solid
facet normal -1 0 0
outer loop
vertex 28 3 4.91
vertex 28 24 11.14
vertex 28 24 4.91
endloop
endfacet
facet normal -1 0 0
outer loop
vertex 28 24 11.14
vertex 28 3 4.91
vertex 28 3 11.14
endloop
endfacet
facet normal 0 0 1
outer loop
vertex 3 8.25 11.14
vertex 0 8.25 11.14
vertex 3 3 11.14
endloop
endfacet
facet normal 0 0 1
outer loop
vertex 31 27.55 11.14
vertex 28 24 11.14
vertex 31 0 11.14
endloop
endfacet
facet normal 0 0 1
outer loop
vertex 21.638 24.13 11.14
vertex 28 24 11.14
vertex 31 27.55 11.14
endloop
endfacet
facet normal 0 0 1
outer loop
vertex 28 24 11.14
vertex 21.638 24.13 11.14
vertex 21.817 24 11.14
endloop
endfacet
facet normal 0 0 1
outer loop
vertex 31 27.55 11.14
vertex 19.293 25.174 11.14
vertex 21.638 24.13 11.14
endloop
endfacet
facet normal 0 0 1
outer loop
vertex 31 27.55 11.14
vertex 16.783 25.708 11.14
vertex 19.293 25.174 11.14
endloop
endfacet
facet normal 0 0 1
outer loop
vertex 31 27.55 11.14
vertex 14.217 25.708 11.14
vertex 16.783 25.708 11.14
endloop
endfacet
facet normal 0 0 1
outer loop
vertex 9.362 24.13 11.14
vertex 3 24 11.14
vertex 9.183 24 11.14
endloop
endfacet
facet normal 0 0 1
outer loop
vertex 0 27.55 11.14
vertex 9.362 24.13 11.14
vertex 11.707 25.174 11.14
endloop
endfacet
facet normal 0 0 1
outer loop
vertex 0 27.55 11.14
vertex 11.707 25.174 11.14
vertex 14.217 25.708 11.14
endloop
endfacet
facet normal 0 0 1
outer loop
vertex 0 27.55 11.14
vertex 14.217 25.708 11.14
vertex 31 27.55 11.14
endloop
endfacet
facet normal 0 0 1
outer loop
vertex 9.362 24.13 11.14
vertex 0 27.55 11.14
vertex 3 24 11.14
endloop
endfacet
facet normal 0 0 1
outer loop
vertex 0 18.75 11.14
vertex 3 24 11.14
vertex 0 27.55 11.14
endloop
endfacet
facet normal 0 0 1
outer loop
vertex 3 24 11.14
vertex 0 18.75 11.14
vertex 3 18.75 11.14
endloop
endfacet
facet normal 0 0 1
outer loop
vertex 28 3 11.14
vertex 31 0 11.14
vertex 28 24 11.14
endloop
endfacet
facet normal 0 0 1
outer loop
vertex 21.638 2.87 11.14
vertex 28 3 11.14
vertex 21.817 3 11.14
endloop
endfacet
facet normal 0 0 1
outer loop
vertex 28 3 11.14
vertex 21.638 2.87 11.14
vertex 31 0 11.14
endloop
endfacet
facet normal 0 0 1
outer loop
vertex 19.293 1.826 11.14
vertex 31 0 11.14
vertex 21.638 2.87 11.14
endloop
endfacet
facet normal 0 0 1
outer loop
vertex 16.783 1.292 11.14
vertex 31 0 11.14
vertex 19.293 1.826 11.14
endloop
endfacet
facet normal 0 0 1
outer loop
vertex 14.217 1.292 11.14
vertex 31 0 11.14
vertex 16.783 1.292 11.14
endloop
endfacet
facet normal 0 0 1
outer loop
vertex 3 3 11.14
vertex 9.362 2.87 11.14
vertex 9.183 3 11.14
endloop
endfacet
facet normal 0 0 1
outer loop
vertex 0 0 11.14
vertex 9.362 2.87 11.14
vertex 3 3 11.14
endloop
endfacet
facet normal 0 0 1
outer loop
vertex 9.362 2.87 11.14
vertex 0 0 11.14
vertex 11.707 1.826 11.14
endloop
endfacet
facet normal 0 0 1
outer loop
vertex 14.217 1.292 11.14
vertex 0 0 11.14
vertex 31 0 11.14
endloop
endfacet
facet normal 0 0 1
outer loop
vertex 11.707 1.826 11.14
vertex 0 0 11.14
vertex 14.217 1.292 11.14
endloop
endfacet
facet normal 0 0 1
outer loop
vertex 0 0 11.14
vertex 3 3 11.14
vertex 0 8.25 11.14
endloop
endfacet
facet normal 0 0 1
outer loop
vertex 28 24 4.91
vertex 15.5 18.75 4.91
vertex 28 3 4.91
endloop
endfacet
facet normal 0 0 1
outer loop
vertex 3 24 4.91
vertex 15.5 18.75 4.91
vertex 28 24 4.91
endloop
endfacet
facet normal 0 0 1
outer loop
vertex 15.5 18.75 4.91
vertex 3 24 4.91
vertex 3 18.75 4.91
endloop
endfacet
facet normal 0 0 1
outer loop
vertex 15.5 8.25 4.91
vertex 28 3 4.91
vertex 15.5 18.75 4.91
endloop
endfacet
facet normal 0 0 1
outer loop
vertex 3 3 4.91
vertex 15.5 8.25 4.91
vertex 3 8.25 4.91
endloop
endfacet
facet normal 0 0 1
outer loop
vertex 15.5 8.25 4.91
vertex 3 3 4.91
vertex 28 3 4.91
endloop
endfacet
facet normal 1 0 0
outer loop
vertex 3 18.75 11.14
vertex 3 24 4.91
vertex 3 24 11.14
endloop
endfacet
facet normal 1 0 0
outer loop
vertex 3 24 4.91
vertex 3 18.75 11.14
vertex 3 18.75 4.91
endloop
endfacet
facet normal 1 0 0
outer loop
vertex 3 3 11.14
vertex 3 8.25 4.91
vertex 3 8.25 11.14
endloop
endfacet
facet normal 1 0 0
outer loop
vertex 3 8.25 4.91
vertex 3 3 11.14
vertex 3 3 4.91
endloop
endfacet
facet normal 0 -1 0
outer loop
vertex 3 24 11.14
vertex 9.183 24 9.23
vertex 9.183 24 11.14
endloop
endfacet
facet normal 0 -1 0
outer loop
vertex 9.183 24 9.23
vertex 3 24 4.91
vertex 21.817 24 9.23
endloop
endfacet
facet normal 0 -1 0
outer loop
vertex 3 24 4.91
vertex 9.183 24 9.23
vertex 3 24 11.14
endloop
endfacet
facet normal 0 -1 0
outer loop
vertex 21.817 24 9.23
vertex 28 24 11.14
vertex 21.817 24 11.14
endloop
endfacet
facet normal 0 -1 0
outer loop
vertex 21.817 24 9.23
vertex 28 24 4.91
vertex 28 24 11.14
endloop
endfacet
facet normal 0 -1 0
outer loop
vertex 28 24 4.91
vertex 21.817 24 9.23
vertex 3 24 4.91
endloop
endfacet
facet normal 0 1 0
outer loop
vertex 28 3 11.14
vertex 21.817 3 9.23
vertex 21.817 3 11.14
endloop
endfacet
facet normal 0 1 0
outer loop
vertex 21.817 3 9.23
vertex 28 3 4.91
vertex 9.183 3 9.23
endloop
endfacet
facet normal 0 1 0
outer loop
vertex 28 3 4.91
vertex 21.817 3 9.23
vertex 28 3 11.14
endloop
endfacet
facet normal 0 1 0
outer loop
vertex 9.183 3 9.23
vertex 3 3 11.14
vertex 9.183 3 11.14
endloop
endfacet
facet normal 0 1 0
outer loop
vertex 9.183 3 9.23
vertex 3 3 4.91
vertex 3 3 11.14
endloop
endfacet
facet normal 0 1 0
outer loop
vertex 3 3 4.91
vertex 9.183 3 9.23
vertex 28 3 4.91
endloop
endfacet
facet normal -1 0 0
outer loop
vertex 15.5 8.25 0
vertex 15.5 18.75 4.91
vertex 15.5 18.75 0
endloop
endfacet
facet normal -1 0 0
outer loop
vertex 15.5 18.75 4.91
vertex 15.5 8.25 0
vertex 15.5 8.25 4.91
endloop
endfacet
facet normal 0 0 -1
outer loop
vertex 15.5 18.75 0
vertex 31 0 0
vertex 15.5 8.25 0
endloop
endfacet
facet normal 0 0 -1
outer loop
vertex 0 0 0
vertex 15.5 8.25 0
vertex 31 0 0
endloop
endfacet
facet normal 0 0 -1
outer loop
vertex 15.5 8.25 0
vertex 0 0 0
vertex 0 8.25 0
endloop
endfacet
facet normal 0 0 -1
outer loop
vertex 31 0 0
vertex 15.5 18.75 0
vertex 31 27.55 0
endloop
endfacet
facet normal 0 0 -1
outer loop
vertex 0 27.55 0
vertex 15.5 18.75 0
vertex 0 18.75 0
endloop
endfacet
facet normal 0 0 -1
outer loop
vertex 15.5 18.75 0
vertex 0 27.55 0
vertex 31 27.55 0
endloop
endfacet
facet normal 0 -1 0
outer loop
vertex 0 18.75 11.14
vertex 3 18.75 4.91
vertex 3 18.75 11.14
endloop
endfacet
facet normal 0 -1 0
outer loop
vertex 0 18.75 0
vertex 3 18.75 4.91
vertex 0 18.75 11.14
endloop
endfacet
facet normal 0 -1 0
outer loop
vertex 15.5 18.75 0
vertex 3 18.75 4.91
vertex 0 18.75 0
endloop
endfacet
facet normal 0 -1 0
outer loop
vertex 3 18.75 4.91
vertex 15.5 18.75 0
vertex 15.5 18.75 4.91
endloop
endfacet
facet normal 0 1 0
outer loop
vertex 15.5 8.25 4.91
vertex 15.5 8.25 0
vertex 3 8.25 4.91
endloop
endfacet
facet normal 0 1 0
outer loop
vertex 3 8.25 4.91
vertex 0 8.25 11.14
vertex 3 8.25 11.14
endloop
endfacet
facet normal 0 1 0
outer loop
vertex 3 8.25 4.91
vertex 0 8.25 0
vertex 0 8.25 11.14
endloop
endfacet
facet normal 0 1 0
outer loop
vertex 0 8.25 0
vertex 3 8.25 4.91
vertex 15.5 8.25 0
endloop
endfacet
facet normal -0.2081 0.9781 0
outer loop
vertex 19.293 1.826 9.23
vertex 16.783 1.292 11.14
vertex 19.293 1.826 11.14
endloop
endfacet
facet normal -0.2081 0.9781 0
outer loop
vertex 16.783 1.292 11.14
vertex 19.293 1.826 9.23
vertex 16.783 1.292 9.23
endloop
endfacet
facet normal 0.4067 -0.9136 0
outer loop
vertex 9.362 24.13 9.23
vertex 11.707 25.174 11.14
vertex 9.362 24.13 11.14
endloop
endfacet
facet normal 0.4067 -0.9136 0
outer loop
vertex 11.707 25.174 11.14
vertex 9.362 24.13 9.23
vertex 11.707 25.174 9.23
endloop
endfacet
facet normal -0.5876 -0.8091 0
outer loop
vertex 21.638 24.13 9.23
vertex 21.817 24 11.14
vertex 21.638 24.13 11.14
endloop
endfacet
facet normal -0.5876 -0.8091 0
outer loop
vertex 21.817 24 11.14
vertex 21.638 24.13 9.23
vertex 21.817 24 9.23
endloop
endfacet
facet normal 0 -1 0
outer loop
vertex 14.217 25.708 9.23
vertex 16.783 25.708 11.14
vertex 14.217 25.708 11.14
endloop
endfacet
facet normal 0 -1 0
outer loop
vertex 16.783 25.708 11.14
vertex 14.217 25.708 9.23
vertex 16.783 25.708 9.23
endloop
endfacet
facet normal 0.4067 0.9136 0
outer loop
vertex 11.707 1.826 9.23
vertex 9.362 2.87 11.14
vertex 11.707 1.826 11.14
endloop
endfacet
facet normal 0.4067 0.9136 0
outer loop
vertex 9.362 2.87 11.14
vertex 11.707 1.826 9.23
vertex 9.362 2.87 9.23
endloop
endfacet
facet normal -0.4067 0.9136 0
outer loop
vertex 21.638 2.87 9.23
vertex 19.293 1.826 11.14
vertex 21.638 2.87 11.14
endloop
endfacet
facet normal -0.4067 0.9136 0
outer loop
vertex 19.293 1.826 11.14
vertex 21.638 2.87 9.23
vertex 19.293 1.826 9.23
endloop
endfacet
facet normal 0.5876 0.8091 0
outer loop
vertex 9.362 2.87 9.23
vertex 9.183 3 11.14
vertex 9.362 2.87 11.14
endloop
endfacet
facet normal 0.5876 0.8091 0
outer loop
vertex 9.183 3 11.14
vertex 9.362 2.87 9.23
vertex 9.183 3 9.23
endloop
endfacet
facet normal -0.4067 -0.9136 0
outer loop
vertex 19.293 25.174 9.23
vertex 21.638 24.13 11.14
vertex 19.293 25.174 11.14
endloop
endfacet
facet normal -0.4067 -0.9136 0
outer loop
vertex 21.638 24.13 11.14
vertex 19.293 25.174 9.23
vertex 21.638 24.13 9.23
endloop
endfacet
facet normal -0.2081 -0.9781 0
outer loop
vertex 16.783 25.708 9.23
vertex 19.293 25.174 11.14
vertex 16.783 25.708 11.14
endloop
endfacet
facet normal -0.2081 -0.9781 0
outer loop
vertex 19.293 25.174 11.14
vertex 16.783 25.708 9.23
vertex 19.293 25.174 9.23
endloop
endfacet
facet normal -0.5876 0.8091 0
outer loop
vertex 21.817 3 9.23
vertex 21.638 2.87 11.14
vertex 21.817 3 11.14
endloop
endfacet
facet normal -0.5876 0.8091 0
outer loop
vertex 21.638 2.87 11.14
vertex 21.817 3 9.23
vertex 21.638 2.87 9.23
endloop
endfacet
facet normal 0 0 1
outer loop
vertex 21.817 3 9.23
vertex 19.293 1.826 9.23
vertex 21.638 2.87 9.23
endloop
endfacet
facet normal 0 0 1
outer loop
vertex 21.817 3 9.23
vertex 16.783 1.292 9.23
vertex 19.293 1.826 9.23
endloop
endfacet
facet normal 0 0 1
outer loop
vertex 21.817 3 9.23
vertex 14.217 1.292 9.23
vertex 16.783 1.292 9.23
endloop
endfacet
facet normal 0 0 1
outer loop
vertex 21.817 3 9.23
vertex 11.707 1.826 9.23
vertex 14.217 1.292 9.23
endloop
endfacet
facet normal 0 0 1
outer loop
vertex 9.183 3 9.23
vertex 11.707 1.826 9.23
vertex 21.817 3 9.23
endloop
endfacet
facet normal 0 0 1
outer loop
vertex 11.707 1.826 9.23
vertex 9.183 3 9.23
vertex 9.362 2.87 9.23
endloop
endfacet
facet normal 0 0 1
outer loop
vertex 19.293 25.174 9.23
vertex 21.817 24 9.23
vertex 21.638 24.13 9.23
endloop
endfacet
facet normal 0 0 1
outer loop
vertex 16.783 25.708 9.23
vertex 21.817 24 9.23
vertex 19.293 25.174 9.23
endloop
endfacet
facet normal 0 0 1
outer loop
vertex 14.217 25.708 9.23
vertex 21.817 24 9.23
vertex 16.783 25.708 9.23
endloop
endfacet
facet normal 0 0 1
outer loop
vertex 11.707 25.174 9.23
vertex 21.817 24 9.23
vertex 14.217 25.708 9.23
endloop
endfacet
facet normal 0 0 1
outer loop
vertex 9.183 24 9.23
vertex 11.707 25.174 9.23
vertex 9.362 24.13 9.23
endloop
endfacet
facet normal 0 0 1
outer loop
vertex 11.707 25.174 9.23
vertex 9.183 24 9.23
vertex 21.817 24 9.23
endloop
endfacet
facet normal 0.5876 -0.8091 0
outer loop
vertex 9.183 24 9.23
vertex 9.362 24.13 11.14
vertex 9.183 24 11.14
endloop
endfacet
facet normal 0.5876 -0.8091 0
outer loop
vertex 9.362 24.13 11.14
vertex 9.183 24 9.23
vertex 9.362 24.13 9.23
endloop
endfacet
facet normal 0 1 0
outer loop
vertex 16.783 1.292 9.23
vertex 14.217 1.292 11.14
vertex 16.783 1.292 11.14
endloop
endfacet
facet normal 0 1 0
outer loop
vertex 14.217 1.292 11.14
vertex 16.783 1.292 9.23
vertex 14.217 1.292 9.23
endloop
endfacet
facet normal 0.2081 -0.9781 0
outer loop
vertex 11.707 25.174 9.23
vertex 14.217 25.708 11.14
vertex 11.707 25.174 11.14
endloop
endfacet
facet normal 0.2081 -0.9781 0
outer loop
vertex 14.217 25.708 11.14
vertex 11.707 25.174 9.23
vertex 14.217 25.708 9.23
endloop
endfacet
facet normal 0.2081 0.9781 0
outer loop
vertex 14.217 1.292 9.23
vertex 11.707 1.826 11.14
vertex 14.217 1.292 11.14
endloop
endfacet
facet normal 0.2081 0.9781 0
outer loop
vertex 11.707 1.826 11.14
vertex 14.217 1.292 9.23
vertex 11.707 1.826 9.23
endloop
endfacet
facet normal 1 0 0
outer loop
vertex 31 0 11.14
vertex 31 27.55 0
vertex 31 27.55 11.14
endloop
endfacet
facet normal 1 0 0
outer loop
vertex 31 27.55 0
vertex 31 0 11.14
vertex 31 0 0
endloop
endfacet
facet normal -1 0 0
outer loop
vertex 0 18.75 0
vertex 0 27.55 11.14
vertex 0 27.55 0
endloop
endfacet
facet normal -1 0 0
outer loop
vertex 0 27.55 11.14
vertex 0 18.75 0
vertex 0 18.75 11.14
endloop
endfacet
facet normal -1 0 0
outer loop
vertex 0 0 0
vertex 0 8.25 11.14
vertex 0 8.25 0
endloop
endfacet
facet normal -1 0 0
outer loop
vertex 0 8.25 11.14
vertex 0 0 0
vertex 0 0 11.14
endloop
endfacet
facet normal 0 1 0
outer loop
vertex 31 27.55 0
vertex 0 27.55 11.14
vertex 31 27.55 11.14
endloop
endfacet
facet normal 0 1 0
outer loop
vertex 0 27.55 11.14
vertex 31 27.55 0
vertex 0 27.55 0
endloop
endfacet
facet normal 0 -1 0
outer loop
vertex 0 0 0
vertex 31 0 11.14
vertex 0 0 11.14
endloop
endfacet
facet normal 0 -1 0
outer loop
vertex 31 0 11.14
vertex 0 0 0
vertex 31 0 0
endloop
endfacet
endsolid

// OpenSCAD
// file: SquareWithCircleTokenPileLib.scad
module LeftPile(
    wallThickness,
    totalHeight,
    singlePileHeight,
    singlePileWidth,
    singlePileLength,
    pileCount,
    circleTokenDiameter,
    circleTokenHeight,
    openingSizePercent = .75
) {
    pileHeight = (pileCount * singlePileHeight) + .5 + circleTokenHeight;
    lengthOpeningSize = singlePileLength * openingSizePercent;
    widthOpeningSize = singlePileWidth * openingSizePercent;
    blockerSize = (singlePileWidth - widthOpeningSize) / 2;
    
    translate([wallThickness, wallThickness, totalHeight - pileHeight])
        cube([singlePileLength, singlePileWidth, pileHeight]);
    translate([-.00001, wallThickness + (blockerSize), 0])
        cube([wallThickness + lengthOpeningSize, widthOpeningSize, totalHeight]);
    translate([wallThickness + singlePileLength/2, wallThickness + singlePileWidth/2, totalHeight - circleTokenHeight])
        cylinder(d=circleTokenDiameter, h=circleTokenHeight);
}

module RightPile(
    wallThickness,
    totalHeight,
    singlePileHeight,
    singlePileWidth,
    singlePileLength,
    pileCount,
    circleTokenDiameter,
    circleTokenHeight,
    openingSizePercent = .75
){
    translate([0, wallThickness + wallThickness + singlePileWidth, 0])
        rotate([0, 0, 180])
            LeftPile(
                wallThickness,
                totalHeight,
                singlePileHeight,
                singlePileWidth,
                singlePileLength,
                pileCount,
                circleTokenDiameter,
                circleTokenHeight,
                openingSizePercent);
}

module BottomPile(
  wallThickness,
    totalHeight,
    singlePileHeight,
    singlePileWidth,
    singlePileLength,
    pileCount,
    circleTokenDiameter,
    circleTokenHeight,
    openingSizePercent = .75
){
    translate([wallThickness + wallThickness + singlePileWidth, 0, 0])
        rotate([0, 0, 90])
            LeftPile(
                wallThickness,
                totalHeight,
                singlePileHeight,
                singlePileWidth,
                singlePileLength,
                pileCount,
                circleTokenDiameter,
                circleTokenHeight,
                openingSizePercent);
}

module TopPile(
  wallThickness,
    totalHeight,
    singlePileHeight,
    singlePileWidth,
    singlePileLength,
    pileCount,
    circleTokenDiameter,
    circleTokenHeight,
    openingSizePercent = .75
){
        rotate([0, 0, 270])
            LeftPile(
                wallThickness,
                totalHeight,
                singlePileHeight,
                singlePileWidth,
                singlePileLength,
                pileCount,
                circleTokenDiameter,
                circleTokenHeight,
                openingSizePercent);
}
// file: BrewcraftersBeerTokensLib.scad
include<SquareWithCircleTokenPileLib.scad>
singleBeerTokenPileHeight = 1.91;
singleBeerTokenPileWidth = 19.5 + 1.5;
singleBeerTokenPileLength = 23.5 + 1.5;
goldLabelDiameter = 24.05 + .5;
goldLabelHeight = 1.91;
openingSizePercent = .5;
boxWidth = goldLabelDiameter;

module LeftBeerTokenPile(wallThickness, totalHeight, beerTokenPileCount){
    LeftPile(
        wallThickness,
        totalHeight,
        singleBeerTokenPileHeight,
        singleBeerTokenPileWidth,
        singleBeerTokenPileLength,
        beerTokenPileCount,
        goldLabelDiameter,
        goldLabelHeight,
        openingSizePercent);
}

module RightBeerTokenPile(wallThickness, totalHeight, beerTokenPileCount){
    RightPile(
        wallThickness,
        totalHeight,
        singleBeerTokenPileHeight,
        singleBeerTokenPileWidth,
        singleBeerTokenPileLength,
        beerTokenPileCount,
        goldLabelDiameter,
        goldLabelHeight,
        openingSizePercent);
}

module BottomBeerTokenPile(wallThickness, totalHeight, beerTokenPileCount){
    BottomPile(
        wallThickness,
        totalHeight,
        singleBeerTokenPileHeight,
        singleBeerTokenPileWidth,
        singleBeerTokenPileLength,
        beerTokenPileCount,
        goldLabelDiameter,
        goldLabelHeight,
        openingSizePercent);
}

module TopBeerTokenPile(wallThickness, totalHeight, beerTokenPileCount){
    TopPile(
        wallThickness,
        totalHeight,
        singleBeerTokenPileHeight,
        singleBeerTokenPileWidth,
        singleBeerTokenPileLength,
        beerTokenPileCount,
        goldLabelDiameter,
        goldLabelHeight,
        openingSizePercent);
}

function beerTokenPileHeight(beerTokenPileCount) =
    (beerTokenPileCount * singleBeerTokenPileHeight) + .5;
// main file
include<BrewcraftersBeerTokensLib.scad>
difference() {
    wallThickness = 3;
    leftTokenCount = 2;
    rightTokenCount = 4;
    bottomTokenCount = 1;
    maxTokenCount = max(leftTokenCount, rightTokenCount, bottomTokenCount);
    floorHeight = 3;
    testBoxHeight = beerTokenPileHeight(maxTokenCount) + floorHeight;
    testBoxLength = singleBeerTokenPileLength + wallThickness * 2;
    testBoxWidth = boxWidth + wallThickness;
    
    
    cube([testBoxLength, testBoxWidth, testBoxHeight]);
    LeftBeerTokenPile(wallThickness, testBoxHeight, leftTokenCount);
//    translate([testBoxLength, 0, 0])
////    translate([testBoxLength, 0, 0])
//        RightBeerTokenPile(wallThickness, testBoxHeight, rightTokenCount);
//    translate([singleBeerTokenPileLength + wallThickness, 0, 0])
//        BottomBeerTokenPile(wallThickness, testBoxHeight, bottomTokenCount);
//    translate([0, testBoxWidth, 0])
//        TopBeerTokenPile(wallThickness, testBoxHeight, 4);
//    translate([boxWidth + wallThickness, testBoxWidth, 0])
//        TopBeerTokenPile(wallThickness, testBoxHeight, leftTokenCount);

}
